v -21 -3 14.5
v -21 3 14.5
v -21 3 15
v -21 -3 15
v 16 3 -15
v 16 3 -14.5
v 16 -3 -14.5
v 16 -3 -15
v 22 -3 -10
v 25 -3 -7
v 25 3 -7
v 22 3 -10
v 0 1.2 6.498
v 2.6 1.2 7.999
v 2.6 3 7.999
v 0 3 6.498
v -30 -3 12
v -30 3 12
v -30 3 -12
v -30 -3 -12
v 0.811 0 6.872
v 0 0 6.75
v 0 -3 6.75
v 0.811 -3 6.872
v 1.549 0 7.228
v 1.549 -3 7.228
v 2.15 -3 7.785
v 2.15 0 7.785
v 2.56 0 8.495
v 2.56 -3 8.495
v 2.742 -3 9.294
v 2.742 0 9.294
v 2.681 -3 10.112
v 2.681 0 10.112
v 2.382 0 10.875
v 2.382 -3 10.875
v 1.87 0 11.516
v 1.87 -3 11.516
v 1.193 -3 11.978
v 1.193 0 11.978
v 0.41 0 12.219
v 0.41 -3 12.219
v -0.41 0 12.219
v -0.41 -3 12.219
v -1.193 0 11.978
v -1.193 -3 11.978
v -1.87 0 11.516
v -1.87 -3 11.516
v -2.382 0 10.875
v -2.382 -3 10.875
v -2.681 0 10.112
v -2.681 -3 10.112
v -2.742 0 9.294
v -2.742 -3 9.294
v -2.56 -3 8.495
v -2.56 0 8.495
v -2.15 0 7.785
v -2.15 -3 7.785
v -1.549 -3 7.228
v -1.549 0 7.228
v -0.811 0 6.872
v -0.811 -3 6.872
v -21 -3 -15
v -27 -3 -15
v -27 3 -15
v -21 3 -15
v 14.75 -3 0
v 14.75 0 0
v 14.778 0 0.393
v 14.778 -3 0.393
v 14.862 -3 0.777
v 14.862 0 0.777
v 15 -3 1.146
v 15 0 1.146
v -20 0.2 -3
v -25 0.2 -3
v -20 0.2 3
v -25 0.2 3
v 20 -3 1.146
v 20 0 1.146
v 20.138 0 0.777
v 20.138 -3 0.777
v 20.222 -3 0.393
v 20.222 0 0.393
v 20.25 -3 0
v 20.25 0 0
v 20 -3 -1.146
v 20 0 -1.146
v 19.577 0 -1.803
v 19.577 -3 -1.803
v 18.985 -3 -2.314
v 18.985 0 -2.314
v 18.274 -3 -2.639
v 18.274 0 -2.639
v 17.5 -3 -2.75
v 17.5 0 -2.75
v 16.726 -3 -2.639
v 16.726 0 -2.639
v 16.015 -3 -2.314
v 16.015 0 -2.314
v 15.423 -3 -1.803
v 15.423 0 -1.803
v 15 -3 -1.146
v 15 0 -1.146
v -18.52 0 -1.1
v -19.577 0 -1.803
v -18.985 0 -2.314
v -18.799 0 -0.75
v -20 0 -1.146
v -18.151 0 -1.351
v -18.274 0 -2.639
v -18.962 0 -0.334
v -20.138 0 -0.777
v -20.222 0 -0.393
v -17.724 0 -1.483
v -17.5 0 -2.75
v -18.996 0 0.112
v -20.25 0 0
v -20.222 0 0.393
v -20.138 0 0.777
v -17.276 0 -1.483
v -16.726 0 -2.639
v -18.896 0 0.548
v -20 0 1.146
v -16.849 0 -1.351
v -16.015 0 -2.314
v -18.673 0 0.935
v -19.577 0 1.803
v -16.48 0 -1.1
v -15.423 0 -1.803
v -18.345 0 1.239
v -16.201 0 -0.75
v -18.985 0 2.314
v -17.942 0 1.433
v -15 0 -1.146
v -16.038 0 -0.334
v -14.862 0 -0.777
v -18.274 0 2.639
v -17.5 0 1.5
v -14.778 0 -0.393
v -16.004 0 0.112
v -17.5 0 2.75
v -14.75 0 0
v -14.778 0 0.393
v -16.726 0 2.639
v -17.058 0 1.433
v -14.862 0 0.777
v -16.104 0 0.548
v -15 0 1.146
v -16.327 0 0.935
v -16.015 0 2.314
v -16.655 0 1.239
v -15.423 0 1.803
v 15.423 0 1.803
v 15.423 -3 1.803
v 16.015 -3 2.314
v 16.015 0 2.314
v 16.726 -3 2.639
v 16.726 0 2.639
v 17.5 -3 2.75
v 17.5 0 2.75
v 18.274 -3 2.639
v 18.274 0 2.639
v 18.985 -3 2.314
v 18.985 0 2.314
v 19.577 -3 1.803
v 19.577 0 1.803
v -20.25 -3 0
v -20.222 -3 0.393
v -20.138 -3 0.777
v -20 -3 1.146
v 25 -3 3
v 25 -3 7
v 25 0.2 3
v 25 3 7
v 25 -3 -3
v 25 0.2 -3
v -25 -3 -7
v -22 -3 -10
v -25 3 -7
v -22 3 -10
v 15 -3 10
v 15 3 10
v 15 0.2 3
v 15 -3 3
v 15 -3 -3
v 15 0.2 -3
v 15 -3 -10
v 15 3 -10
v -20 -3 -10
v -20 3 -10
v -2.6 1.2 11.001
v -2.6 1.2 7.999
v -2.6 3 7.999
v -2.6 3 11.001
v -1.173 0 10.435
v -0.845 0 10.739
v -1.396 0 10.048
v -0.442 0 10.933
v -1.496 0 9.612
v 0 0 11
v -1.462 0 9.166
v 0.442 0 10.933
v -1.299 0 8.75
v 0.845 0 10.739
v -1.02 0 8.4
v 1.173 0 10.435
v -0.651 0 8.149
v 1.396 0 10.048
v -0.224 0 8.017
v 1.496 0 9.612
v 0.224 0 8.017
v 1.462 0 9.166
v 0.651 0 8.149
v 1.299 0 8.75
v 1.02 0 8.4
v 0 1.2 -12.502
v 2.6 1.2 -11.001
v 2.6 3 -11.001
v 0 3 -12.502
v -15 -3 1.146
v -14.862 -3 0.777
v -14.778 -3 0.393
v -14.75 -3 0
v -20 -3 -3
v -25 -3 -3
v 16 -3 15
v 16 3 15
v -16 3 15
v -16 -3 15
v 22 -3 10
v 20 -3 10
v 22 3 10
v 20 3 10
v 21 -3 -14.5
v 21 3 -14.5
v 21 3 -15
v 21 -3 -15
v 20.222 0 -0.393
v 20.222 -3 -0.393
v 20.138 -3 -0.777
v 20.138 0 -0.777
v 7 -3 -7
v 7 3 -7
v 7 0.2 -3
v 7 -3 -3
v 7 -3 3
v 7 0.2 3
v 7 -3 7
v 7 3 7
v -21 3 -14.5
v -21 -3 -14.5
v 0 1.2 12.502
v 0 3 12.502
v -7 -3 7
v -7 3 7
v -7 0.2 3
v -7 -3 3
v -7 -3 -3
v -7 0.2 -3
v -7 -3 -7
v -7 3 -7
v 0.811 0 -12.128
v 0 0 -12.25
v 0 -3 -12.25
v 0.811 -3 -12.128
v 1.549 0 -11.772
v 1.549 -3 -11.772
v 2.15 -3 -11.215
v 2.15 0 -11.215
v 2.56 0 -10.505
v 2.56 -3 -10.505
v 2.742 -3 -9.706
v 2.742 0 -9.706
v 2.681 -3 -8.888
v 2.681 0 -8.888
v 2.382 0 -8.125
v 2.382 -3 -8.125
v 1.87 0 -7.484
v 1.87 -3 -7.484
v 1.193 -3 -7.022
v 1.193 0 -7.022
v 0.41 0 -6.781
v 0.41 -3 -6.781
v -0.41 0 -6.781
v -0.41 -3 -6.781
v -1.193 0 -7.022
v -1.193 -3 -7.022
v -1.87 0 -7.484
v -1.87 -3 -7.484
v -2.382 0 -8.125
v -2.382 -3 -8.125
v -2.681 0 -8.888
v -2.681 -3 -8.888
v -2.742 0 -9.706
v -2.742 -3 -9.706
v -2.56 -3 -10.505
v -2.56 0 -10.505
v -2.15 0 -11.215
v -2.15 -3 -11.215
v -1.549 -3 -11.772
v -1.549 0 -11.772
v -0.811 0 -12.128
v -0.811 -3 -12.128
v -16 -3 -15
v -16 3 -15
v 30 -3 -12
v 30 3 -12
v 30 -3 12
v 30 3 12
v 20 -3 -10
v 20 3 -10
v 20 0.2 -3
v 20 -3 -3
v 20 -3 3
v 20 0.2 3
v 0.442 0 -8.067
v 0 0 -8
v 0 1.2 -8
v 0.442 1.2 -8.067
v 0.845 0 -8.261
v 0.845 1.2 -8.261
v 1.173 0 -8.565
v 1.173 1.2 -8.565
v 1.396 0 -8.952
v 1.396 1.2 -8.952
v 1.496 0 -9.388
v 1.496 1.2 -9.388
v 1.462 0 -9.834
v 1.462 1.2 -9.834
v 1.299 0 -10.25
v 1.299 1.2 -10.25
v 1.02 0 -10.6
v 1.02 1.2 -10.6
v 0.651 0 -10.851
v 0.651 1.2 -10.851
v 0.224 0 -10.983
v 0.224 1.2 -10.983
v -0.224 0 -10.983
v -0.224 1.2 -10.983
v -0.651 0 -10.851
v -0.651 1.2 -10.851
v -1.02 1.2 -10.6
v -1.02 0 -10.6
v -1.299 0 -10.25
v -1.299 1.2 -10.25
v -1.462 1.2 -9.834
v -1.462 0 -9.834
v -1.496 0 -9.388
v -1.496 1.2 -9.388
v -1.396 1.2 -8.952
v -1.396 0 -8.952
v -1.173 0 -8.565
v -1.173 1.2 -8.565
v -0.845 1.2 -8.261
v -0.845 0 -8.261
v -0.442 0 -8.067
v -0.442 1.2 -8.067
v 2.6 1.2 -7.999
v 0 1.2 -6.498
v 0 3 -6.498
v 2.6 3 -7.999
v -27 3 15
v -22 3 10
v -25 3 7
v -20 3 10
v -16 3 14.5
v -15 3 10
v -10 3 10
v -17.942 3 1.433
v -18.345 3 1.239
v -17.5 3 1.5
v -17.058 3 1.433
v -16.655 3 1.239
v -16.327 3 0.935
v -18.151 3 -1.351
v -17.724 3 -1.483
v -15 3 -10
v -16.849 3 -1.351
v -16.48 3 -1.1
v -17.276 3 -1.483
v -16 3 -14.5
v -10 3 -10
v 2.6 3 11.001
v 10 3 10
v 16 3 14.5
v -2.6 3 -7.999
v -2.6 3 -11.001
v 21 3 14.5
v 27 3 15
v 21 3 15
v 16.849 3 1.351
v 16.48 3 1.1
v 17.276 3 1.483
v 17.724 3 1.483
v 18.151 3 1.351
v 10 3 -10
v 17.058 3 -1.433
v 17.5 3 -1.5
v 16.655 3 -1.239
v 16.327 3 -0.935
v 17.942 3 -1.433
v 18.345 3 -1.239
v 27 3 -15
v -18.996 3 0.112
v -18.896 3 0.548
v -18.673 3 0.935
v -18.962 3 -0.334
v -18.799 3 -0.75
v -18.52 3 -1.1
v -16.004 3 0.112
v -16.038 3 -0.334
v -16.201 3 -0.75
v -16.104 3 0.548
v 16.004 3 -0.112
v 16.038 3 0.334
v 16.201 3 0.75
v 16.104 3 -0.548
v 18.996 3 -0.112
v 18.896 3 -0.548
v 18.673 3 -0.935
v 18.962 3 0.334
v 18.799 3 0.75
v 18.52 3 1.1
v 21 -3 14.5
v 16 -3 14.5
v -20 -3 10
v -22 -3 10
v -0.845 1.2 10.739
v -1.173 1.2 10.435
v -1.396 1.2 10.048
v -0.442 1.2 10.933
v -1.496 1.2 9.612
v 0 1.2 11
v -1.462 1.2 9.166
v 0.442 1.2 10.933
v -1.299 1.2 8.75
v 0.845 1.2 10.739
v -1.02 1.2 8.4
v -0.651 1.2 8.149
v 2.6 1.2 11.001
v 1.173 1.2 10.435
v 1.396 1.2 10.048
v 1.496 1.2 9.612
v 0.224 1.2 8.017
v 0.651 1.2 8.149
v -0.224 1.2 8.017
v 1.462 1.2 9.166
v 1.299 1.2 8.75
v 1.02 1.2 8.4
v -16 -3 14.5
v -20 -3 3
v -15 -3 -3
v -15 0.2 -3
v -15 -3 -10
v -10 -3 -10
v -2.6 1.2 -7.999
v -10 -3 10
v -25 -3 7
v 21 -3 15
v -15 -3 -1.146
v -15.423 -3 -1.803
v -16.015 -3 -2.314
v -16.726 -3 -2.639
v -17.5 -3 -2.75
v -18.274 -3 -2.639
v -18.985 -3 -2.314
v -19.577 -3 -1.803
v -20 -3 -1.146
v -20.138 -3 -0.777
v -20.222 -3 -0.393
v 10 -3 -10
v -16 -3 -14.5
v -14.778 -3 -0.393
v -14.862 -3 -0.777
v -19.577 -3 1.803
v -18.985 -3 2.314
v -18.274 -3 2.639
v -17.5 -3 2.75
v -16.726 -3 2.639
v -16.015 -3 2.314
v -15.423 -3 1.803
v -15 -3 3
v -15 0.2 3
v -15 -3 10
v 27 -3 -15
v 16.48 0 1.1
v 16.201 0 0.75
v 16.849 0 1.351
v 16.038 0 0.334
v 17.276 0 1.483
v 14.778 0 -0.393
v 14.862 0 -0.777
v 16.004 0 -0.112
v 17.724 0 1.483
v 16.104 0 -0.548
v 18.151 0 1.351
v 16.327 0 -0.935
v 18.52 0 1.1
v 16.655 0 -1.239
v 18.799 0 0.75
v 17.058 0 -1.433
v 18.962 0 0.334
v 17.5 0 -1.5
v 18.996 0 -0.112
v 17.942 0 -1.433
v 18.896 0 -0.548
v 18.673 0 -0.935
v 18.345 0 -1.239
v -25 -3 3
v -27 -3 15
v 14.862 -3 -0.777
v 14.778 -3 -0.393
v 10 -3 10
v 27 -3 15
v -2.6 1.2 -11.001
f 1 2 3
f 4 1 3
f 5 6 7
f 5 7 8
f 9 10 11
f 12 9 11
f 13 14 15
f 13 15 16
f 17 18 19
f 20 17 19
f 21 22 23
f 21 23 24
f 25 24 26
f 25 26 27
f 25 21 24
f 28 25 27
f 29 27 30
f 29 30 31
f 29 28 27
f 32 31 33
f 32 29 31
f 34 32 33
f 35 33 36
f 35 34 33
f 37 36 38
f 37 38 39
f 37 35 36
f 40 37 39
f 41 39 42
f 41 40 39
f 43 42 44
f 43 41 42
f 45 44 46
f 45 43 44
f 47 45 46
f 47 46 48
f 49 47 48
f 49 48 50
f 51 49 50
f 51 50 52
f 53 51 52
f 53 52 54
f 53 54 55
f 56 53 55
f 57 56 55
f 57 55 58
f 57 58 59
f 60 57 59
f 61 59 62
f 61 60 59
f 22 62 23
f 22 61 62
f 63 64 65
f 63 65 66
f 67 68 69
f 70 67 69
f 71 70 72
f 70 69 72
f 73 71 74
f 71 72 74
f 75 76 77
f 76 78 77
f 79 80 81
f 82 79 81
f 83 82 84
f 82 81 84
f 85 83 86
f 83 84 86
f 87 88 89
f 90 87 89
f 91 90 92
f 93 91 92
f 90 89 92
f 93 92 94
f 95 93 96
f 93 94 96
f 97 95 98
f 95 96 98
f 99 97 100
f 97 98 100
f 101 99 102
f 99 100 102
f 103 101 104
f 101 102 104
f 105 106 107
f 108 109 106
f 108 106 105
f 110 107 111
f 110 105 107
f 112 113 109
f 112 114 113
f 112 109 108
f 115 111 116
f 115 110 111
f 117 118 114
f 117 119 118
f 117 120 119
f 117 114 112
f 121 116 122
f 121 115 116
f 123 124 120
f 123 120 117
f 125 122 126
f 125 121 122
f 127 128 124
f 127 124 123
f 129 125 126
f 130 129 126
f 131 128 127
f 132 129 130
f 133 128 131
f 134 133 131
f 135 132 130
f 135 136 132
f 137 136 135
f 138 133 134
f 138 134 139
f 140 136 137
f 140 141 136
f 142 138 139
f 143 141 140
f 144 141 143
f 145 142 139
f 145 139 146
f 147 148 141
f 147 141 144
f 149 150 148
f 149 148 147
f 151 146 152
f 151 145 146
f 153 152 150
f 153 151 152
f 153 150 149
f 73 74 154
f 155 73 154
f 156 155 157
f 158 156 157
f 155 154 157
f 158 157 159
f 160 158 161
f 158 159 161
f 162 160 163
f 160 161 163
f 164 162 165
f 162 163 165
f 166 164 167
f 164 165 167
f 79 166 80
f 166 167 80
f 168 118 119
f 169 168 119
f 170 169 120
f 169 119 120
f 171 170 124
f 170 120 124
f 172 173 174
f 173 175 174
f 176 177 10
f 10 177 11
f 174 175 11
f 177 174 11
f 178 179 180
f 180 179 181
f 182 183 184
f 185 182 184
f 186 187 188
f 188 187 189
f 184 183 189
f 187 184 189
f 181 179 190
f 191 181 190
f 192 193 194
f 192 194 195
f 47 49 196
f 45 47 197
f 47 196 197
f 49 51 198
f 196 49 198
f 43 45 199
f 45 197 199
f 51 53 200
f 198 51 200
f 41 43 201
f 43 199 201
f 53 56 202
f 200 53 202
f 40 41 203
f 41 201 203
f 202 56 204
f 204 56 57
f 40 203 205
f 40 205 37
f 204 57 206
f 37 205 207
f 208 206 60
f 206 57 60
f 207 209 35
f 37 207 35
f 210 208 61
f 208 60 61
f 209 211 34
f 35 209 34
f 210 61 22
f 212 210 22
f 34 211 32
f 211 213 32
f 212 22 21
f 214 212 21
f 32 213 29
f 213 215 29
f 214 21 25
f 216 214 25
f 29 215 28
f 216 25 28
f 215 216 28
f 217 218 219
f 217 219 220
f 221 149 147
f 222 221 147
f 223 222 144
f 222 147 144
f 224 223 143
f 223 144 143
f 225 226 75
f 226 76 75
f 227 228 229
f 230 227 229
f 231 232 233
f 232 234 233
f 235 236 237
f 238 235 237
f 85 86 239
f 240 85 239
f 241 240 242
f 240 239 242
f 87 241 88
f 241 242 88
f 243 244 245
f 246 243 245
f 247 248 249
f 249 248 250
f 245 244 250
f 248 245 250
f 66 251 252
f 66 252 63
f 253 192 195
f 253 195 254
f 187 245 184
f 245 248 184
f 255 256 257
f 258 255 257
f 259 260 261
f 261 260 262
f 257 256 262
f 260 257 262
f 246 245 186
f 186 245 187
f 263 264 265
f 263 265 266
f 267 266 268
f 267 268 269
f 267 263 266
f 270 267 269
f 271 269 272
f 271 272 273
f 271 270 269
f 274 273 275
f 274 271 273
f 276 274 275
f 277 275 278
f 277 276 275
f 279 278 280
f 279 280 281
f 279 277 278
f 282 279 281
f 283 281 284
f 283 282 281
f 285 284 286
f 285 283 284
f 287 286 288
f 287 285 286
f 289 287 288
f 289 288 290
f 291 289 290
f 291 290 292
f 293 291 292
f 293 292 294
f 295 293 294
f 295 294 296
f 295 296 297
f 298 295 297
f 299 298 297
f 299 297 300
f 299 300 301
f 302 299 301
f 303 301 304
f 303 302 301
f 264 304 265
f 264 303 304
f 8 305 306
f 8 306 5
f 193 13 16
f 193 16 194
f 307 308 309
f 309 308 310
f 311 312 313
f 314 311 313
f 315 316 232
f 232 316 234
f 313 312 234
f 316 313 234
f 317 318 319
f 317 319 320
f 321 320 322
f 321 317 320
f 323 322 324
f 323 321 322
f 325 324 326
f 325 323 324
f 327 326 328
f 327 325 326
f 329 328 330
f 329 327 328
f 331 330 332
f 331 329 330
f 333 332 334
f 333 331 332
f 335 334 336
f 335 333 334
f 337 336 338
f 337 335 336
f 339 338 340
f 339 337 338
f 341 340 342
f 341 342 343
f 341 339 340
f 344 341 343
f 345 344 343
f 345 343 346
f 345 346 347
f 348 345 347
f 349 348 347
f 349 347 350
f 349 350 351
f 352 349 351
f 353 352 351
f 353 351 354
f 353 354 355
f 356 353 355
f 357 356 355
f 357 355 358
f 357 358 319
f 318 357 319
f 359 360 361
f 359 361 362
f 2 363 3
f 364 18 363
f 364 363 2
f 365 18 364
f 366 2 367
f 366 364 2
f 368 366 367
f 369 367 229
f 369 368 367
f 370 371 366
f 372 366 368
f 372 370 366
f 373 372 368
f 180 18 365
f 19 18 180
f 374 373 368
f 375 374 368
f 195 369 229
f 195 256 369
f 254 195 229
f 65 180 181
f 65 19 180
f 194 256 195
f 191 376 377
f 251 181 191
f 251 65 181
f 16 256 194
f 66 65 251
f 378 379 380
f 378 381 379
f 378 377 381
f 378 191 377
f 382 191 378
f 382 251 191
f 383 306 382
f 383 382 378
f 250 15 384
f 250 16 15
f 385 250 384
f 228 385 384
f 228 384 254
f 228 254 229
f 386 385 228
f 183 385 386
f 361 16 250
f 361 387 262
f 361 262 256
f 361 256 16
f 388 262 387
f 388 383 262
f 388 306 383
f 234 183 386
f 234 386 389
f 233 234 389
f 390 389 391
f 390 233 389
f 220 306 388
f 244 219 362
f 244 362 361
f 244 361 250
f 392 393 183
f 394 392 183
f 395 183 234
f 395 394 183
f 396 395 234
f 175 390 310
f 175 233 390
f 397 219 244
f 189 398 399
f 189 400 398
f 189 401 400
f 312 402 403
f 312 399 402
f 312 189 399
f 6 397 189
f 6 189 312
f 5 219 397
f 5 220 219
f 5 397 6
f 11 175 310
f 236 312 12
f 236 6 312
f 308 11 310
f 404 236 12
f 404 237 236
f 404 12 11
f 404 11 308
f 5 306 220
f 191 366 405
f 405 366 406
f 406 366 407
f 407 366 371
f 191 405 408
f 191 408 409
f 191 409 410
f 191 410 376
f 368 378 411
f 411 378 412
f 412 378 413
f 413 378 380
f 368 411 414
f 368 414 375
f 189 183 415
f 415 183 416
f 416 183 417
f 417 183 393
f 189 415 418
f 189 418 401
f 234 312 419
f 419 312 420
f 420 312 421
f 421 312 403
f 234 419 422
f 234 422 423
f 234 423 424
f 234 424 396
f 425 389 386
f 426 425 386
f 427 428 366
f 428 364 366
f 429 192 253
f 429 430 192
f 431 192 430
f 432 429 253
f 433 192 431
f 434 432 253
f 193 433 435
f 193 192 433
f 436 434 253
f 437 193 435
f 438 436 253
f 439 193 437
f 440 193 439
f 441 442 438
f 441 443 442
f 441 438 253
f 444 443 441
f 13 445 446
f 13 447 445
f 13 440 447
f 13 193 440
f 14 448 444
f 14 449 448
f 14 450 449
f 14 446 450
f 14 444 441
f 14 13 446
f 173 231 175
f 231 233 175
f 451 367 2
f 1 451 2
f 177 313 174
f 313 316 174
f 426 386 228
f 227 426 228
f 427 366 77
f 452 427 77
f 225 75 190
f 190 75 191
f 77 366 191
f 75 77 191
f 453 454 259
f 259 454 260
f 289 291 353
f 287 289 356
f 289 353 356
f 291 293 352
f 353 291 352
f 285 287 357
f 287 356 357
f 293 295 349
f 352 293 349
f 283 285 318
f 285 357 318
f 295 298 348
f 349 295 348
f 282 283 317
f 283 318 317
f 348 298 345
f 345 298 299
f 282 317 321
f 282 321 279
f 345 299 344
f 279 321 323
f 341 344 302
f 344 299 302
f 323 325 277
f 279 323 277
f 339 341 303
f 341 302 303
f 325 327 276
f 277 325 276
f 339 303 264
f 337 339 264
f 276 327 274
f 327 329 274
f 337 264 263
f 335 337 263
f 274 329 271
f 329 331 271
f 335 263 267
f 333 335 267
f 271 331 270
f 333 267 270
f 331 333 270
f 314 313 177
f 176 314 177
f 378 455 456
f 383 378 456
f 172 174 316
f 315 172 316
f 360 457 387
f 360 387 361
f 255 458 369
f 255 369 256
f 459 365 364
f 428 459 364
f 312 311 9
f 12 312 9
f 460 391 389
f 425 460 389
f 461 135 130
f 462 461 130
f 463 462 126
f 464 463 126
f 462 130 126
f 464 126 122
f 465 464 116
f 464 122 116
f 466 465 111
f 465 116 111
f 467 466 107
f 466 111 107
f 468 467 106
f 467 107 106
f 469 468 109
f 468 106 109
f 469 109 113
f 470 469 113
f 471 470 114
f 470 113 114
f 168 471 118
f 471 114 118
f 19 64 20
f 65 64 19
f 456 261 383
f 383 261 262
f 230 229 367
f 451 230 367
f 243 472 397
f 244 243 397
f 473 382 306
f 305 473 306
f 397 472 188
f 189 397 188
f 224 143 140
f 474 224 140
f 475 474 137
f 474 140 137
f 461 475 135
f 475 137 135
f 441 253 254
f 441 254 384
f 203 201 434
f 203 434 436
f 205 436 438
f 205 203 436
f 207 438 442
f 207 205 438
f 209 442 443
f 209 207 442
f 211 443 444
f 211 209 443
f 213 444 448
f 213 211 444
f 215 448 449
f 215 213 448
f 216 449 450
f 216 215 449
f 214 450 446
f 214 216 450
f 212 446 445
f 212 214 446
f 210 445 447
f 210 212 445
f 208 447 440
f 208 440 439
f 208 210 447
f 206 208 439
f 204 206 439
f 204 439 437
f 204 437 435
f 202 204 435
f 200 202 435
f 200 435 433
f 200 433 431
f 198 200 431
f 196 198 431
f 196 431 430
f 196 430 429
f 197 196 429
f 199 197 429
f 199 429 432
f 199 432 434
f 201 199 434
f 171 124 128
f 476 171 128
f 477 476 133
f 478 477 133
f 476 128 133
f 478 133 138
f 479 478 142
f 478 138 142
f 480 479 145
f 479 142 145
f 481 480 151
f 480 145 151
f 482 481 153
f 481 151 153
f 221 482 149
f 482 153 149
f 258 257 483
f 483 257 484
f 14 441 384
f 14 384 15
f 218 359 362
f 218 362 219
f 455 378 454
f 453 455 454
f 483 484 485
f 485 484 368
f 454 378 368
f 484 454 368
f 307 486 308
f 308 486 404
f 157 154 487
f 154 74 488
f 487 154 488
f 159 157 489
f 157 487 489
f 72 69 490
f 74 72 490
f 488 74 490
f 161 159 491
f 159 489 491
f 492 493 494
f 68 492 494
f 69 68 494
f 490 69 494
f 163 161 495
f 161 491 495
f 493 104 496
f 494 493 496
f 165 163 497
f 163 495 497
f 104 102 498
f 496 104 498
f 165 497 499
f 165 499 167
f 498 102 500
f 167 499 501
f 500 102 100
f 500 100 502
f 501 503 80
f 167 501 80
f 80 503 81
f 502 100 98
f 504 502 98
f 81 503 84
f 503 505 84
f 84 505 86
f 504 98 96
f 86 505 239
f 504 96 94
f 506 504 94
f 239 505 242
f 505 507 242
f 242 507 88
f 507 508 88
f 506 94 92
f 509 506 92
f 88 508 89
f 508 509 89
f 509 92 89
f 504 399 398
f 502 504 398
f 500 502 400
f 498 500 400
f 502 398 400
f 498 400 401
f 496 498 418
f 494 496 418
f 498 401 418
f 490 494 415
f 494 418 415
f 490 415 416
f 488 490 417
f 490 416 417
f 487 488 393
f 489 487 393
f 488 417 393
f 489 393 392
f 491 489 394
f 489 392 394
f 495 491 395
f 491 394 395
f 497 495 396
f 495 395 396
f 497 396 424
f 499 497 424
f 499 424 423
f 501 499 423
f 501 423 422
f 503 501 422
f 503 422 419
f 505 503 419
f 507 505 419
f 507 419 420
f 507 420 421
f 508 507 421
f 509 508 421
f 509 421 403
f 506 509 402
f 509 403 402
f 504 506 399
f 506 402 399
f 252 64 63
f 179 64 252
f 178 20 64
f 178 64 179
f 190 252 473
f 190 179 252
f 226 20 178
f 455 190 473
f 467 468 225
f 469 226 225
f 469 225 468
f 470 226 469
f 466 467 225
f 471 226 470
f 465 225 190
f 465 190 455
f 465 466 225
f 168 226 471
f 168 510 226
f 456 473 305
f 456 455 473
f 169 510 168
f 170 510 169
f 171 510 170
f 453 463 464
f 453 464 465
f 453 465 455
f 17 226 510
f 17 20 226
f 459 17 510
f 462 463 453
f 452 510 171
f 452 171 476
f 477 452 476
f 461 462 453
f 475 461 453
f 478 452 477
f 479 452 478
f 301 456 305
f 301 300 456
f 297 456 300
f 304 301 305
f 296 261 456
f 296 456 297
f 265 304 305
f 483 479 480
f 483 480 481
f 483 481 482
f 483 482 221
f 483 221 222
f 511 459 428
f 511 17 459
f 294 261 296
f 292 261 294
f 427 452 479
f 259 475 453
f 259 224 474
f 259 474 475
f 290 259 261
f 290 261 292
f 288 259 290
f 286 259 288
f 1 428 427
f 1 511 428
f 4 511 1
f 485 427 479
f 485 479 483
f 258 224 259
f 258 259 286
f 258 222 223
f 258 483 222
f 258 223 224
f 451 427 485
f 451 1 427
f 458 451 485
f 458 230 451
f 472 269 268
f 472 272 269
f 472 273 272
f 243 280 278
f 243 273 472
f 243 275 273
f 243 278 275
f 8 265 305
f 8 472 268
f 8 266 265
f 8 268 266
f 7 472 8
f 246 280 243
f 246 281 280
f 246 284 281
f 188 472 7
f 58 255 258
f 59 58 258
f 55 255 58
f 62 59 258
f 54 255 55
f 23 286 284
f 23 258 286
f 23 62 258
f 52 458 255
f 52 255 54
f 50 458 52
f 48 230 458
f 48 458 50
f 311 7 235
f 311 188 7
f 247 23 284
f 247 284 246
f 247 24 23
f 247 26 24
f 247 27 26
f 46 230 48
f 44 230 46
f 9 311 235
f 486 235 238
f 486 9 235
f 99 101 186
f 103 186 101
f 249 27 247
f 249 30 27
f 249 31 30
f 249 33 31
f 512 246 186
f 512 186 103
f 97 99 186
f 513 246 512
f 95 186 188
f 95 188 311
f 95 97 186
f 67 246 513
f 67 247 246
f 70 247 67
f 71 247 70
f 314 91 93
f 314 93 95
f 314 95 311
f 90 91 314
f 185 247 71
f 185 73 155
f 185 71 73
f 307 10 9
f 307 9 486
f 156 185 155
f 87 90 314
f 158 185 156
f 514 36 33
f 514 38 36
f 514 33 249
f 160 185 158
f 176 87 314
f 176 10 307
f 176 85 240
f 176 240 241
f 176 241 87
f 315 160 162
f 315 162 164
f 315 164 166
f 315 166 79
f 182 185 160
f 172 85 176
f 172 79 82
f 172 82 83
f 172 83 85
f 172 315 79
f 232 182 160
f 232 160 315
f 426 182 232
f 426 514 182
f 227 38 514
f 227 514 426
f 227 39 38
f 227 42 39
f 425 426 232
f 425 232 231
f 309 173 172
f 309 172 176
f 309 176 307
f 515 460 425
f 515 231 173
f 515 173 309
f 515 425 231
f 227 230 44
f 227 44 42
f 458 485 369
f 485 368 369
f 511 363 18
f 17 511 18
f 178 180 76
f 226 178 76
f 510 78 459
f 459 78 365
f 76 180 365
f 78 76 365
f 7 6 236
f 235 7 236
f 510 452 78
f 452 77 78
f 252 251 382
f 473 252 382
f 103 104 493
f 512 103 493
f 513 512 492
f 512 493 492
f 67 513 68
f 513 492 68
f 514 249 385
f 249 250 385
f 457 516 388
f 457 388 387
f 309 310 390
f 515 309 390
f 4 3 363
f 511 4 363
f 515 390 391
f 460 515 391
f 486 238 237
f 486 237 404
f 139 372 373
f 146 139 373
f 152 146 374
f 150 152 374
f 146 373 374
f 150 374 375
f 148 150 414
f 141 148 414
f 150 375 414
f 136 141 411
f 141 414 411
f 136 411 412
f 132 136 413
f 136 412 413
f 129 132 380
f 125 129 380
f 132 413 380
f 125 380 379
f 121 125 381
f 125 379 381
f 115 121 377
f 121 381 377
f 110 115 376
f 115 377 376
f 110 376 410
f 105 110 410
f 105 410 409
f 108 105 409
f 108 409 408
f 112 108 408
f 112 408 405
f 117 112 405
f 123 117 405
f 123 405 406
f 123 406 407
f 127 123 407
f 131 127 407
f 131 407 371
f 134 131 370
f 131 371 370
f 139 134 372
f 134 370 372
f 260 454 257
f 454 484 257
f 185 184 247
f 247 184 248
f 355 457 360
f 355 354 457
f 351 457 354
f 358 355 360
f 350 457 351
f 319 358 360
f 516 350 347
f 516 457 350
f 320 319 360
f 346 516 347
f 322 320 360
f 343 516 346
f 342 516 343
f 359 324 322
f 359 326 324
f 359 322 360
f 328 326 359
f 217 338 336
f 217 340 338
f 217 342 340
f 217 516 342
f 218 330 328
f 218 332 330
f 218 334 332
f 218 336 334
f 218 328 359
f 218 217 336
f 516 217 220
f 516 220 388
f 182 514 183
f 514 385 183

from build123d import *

# Parameters (mm, degrees)
SKETCH_1_W          = 60
SKETCH_1_H          = 30
SKETCH_1_W_2        = 18
SKETCH_1_H_2        = 20
SKETCH_1_R          = 1.5
EXTRUDE_1_DEPTH     = 3
CUT_EXTRUDE_START   = 1.2
SKETCH_1_3_R        = 1.5
CUT_EXTRUDE_1_DEPTH = 1.8
CHAMFER_1_SIZE      = 3
SKETCH_2_W          = 5
SKETCH_2_H          = 0.5
CUT_EXTRUDE_2_DEPTH = 34.674916481
SKETCH_3_W          = 5
SKETCH_3_H          = 20
SKETCH_3_R          = 1.5
EXTRUDE_2_DEPTH     = 3
SKETCH_4_R          = 2.75
SKETCH_4_W          = 14
SKETCH_4_H          = 3
EXTRUDE_3_DEPTH     = 3
EXTRUDE_START       = -0.2
EXTRUDE_4_DEPTH     = 0.2


with BuildPart() as part:
    # 스케치1 → 보스-돌출1 (new body)
    # profile 1 of 3: a face of its own
    with BuildSketch(Plane(origin=(0, 0, 0), x_dir=(1, 0, 0), z_dir=(0, 1, 0))):
        Rectangle(SKETCH_1_W, SKETCH_1_H)
        Polygon((2.6, 11.0011107), (0, 12.5022214), (-2.6, 11.0011107), (-2.6, 7.9988893), (0, 6.4977786), (2.6, 7.9988893), align=None, mode=Mode.SUBTRACT)
        Polygon((2.6, -7.9988893), (0, -6.4977786), (-2.6, -7.9988893), (-2.6, -11.0011107), (0, -12.5022214), (2.6, -11.0011107), align=None, mode=Mode.SUBTRACT)
        with Locations((-16, 0)):
            Rectangle(SKETCH_1_W_2, SKETCH_1_H_2, mode=Mode.SUBTRACT)
        with Locations((16, 0)):
            Rectangle(SKETCH_1_W_2, SKETCH_1_H_2, mode=Mode.SUBTRACT)
    # profile 2 of 3: a face of its own
    with BuildSketch(Plane(origin=(0, 0, 0), x_dir=(1, 0, 0), z_dir=(0, 1, 0))):
        Polygon((2.6, -11.0011107), (2.6, -7.9988893), (0, -6.4977786), (-2.6, -7.9988893), (-2.6, -11.0011107), (0, -12.5022214), align=None)
        with Locations(Location((0, -9.5, 0), (0, 0, 270))):
            Circle(SKETCH_1_R, mode=Mode.SUBTRACT)
    # profile 3 of 3: a face of its own
    with BuildSketch(Plane(origin=(0, 0, 0), x_dir=(1, 0, 0), z_dir=(0, 1, 0))):
        Polygon((2.6, 7.9988893), (2.6, 11.0011107), (0, 12.5022214), (-2.6, 11.0011107), (-2.6, 7.9988893), (0, 6.4977786), align=None)
        with Locations(Location((0, 9.5, 0), (0, 0, 270))):
            Circle(SKETCH_1_R, mode=Mode.SUBTRACT)
    extrude(amount=EXTRUDE_1_DEPTH)

    # 스케치1<3> → 컷-돌출1 (cut)
    # profile 1 of 2: a face of its own
    with BuildSketch(Plane(origin=(0, 0, 0), x_dir=(1, 0, 0), z_dir=(0, 1, 0)).offset(CUT_EXTRUDE_START)):
        Polygon((2.6, -11.0011107), (2.6, -7.9988893), (0, -6.4977786), (-2.6, -7.9988893), (-2.6, -11.0011107), (0, -12.5022214), align=None)
        with Locations(Location((0, -9.5, 0), (0, 0, 270))):
            Circle(SKETCH_1_3_R, mode=Mode.SUBTRACT)
    # profile 2 of 2: a face of its own
    with BuildSketch(Plane(origin=(0, 0, 0), x_dir=(1, 0, 0), z_dir=(0, 1, 0)).offset(CUT_EXTRUDE_START)):
        Polygon((2.6, 7.9988893), (2.6, 11.0011107), (0, 12.5022214), (-2.6, 11.0011107), (-2.6, 7.9988893), (0, 6.4977786), align=None)
        with Locations(Location((0, 9.5, 0), (0, 0, 270))):
            Circle(SKETCH_1_3_R, mode=Mode.SUBTRACT)
    extrude(amount=CUT_EXTRUDE_1_DEPTH, mode=Mode.SUBTRACT)

    # 모따기1
    chamfer_1_edges = [part.edges().sort_by_distance(p)[0] for p in [
        (25, 1.5, -10),
        (7, 1.5, -10),
        (7, 1.5, 10),
        (25, 1.5, 10),
        (-25, 1.5, -10),
        (-25, 1.5, 10),
        (-7, 1.5, 10),
        (-7, 1.5, -10),
        (-30, 1.5, 15),
        (-30, 1.5, -15),
        (30, 1.5, -15),
        (30, 1.5, 15),
    ]]
    chamfer(chamfer_1_edges, length=CHAMFER_1_SIZE)

    # 스케치2 → 컷-돌출2 (cut, through all)
    with BuildSketch(Plane(origin=(0, 3, 0), x_dir=(1, 0, 0), z_dir=(0, 1, 0))):
        with Locations((-18.5, -14.75)):
            Rectangle(SKETCH_2_W, SKETCH_2_H)
        with Locations((18.5, -14.75)):
            Rectangle(SKETCH_2_W, SKETCH_2_H)
        with Locations((18.5, 14.75)):
            Rectangle(SKETCH_2_W, SKETCH_2_H)
        with Locations((-18.5, 14.75)):
            Rectangle(SKETCH_2_W, SKETCH_2_H)
    extrude(amount=-CUT_EXTRUDE_2_DEPTH, mode=Mode.SUBTRACT)

    # 스케치3 → 보스-돌출2 (add)
    # profile 1 of 2: a face of its own
    with BuildSketch(Plane(origin=(0, 3, 0), x_dir=(1, 0, 0), z_dir=(0, 1, 0))):
        with Locations((-17.5, 0)):
            Rectangle(SKETCH_3_W, SKETCH_3_H)
        with Locations(Location((-17.5, 0, 0), (0, 0, 270))):
            Circle(SKETCH_3_R, mode=Mode.SUBTRACT)
    # profile 2 of 2: a face of its own
    with BuildSketch(Plane(origin=(0, 3, 0), x_dir=(1, 0, 0), z_dir=(0, 1, 0))):
        with Locations((17.5, 0)):
            Rectangle(SKETCH_3_W, SKETCH_3_H)
        with Locations(Location((17.5, 0, 0), (0, 0, 90))):
            Circle(SKETCH_3_R, mode=Mode.SUBTRACT)
    extrude(amount=-EXTRUDE_2_DEPTH)

    # 스케치4 → 보스-돌출3 (add)
    # profile 1 of 16: a face of its own
    with BuildSketch(Plane.XZ):
        Polygon((-25, 7), (-22, 10), (-20, 10), (-20, 3), (-15, 3), (-15, 10), (-10, 10), (-7, 7), (-7, 3), (7, 3), (7, 7), (10, 10), (15, 10), (15, 3), (20, 3), (20, 10), (22, 10), (25, 7), (25, 3), (25, 0), (30, 0), (30, 12), (27, 15), (21, 15), (21, 14.5), (16, 14.5), (16, 15), (-16, 15), (-16, 14.5), (-21, 14.5), (-21, 15), (-27, 15), (-30, 12), (-30, 0), (-25, 0), (-25, 3), align=None)
        with Locations(Location((0, 9.5, 0), (0, 0, 270))):
            Circle(SKETCH_4_R, mode=Mode.SUBTRACT)
    # profile 2 of 16: a face of its own
    with BuildSketch(Plane.XZ):
        Polygon((-25, -3), (-25, 0), (-30, 0), (-30, -12), (-27, -15), (-21, -15), (-21, -14.5), (-16, -14.5), (-16, -15), (16, -15), (16, -14.5), (21, -14.5), (21, -15), (27, -15), (30, -12), (30, 0), (25, 0), (25, -3), (25, -7), (22, -10), (20, -10), (20, -3), (15, -3), (15, -10), (10, -10), (7, -7), (7, -3), (-7, -3), (-7, -7), (-10, -10), (-15, -10), (-15, -3), (-20, -3), (-20, -10), (-22, -10), (-25, -7), align=None)
        with Locations(Location((0, -9.5, 0), (0, 0, 270))):
            Circle(SKETCH_4_R, mode=Mode.SUBTRACT)
    # profile 3 of 16: a face of its own
    with BuildSketch(Plane.XZ):
        with Locations((0, 1.5)):
            Rectangle(SKETCH_4_W, SKETCH_4_H)
    # profile 4 of 16: a face of its own
    with BuildSketch(Plane.XZ):
        with Locations((0, -1.5)):
            Rectangle(SKETCH_4_W, SKETCH_4_H)
    # profile 5 of 16: a face of its own
    with BuildSketch(Plane.XZ):
        with BuildLine():
            Line((-20, 1.145643924), (-20, 3))
            Line((-20, 3), (-25, 3))
            Line((-25, 3), (-25, 0))
            Line((-25, 0), (-20.25, 0))
            ThreePointArc((-20.25, 0), (-20.186773158, 0.58630197), (-20, 1.145643924))
        make_face()
    # profile 6 of 16: a face of its own
    with BuildSketch(Plane.XZ):
        with BuildLine():
            Line((-20.25, 0), (-25, 0))
            Line((-25, 0), (-25, -3))
            Line((-25, -3), (-20, -3))
            Line((-20, -3), (-20, -1.145643924))
            ThreePointArc((-20, -1.145643924), (-20.186773158, -0.58630197), (-20.25, 0))
        make_face()
    # profile 7 of 16: a face of its own
    with BuildSketch(Plane.XZ):
        with BuildLine():
            Line((-15, 3), (-20, 3))
            Line((-20, 3), (-20, 1.145643924))
            ThreePointArc((-20, 1.145643924), (-17.5, 2.75), (-15, 1.145643924))
            Line((-15, 1.145643924), (-15, 3))
        make_face()
    # profile 8 of 16: a face of its own
    with BuildSketch(Plane.XZ):
        with BuildLine():
            Line((-7, 3), (-15, 3))
            Line((-15, 3), (-15, 1.145643924))
            ThreePointArc((-15, 1.145643924), (-14.813226842, 0.58630197), (-14.75, 0))
            Line((-14.75, 0), (-7, 0))
            Line((-7, 0), (-7, 3))
        make_face()
    # profile 9 of 16: a face of its own
    with BuildSketch(Plane.XZ):
        with BuildLine():
            ThreePointArc((-15, -1.145643924), (-17.5, -2.75), (-20, -1.145643924))
            Line((-20, -1.145643924), (-20, -3))
            Line((-20, -3), (-15, -3))
            Line((-15, -3), (-15, -1.145643924))
        make_face()
    # profile 10 of 16: a face of its own
    with BuildSketch(Plane.XZ):
        with BuildLine():
            Line((-7, 0), (-14.75, 0))
            ThreePointArc((-14.75, 0), (-14.813226842, -0.58630197), (-15, -1.145643924))
            Line((-15, -1.145643924), (-15, -3))
            Line((-15, -3), (-7, -3))
            Line((-7, -3), (-7, 0))
        make_face()
    # profile 11 of 16: a face of its own
    with BuildSketch(Plane.XZ):
        with BuildLine():
            Line((15, 3), (7, 3))
            Line((7, 3), (7, 0))
            Line((7, 0), (14.75, 0))
            ThreePointArc((14.75, 0), (14.813226842, 0.58630197), (15, 1.145643924))
            Line((15, 1.145643924), (15, 3))
        make_face()
    # profile 12 of 16: a face of its own
    with BuildSketch(Plane.XZ):
        with BuildLine():
            Line((14.75, 0), (7, 0))
            Line((7, 0), (7, -3))
            Line((7, -3), (15, -3))
            Line((15, -3), (15, -1.145643924))
            ThreePointArc((15, -1.145643924), (14.813226842, -0.58630197), (14.75, 0))
        make_face()
    # profile 13 of 16: a face of its own
    with BuildSketch(Plane.XZ):
        with BuildLine():
            Line((20, 3), (15, 3))
            Line((15, 3), (15, 1.145643924))
            ThreePointArc((15, 1.145643924), (17.5, 2.75), (20, 1.145643924))
            Line((20, 1.145643924), (20, 3))
        make_face()
    # profile 14 of 16: a face of its own
    with BuildSketch(Plane.XZ):
        with BuildLine():
            Line((15, -1.145643924), (15, -3))
            Line((15, -3), (20, -3))
            Line((20, -3), (20, -1.145643924))
            ThreePointArc((20, -1.145643924), (17.5, -2.75), (15, -1.145643924))
        make_face()
    # profile 15 of 16: a face of its own
    with BuildSketch(Plane.XZ):
        with BuildLine():
            Line((20, -1.145643924), (20, -3))
            Line((20, -3), (25, -3))
            Line((25, -3), (25, 0))
            Line((25, 0), (20.25, 0))
            ThreePointArc((20.25, 0), (20.186773158, -0.58630197), (20, -1.145643924))
        make_face()
    # profile 16 of 16: a face of its own
    with BuildSketch(Plane.XZ):
        with BuildLine():
            Line((25, 3), (20, 3))
            Line((20, 3), (20, 1.145643924))
            ThreePointArc((20, 1.145643924), (20.186773158, 0.58630197), (20.25, 0))
            Line((20.25, 0), (25, 0))
            Line((25, 0), (25, 3))
        make_face()
    extrude(amount=EXTRUDE_3_DEPTH)

    # 스케치4<3> → 보스-돌출4 (add)
    with BuildSketch(Plane.XZ.offset(EXTRUDE_START)):
        with BuildLine():
            ThreePointArc((20.25, 0), (20.186773158, 0.58630197), (20, 1.145643924))
            Line((20, 1.145643924), (20, 0))
            Line((20, 0), (20.25, 0))
        make_face()
        with BuildLine():
            Line((20, 0), (20, -1.145643924))
            ThreePointArc((20, -1.145643924), (20.186773158, -0.58630197), (20.25, 0))
            Line((20.25, 0), (20, 0))
        make_face()
        with BuildLine():
            Line((20, -1.145643924), (20, -3))
            Line((20, -3), (25, -3))
            Line((25, -3), (25, 0))
            Line((25, 0), (20.25, 0))
            ThreePointArc((20.25, 0), (20.186773158, -0.58630197), (20, -1.145643924))
        make_face()
        with BuildLine():
            Line((25, 3), (20, 3))
            Line((20, 3), (20, 1.145643924))
            ThreePointArc((20, 1.145643924), (20.186773158, 0.58630197), (20.25, 0))
            Line((20.25, 0), (25, 0))
            Line((25, 0), (25, 3))
        make_face()
        with BuildLine():
            ThreePointArc((15, 1.145643924), (14.813226842, 0.58630197), (14.75, 0))
            Line((14.75, 0), (15, 0))
            Line((15, 0), (15, 1.145643924))
        make_face()
        with BuildLine():
            Line((15, 0), (14.75, 0))
            ThreePointArc((14.75, 0), (14.813226842, -0.58630197), (15, -1.145643924))
            Line((15, -1.145643924), (15, 0))
        make_face()
        with BuildLine():
            Line((14.75, 0), (7, 0))
            Line((7, 0), (7, -3))
            Line((7, -3), (15, -3))
            Line((15, -3), (15, -1.145643924))
            ThreePointArc((15, -1.145643924), (14.813226842, -0.58630197), (14.75, 0))
        make_face()
        with BuildLine():
            Line((15, 3), (7, 3))
            Line((7, 3), (7, 0))
            Line((7, 0), (14.75, 0))
            ThreePointArc((14.75, 0), (14.813226842, 0.58630197), (15, 1.145643924))
            Line((15, 1.145643924), (15, 3))
        make_face()
        with BuildLine():
            Line((-20, 0), (-20, 1.145643924))
            ThreePointArc((-20, 1.145643924), (-20.186773158, 0.58630197), (-20.25, 0))
            Line((-20.25, 0), (-20, 0))
        make_face()
        with BuildLine():
            Line((-20, -1.145643924), (-20, 0))
            Line((-20, 0), (-20.25, 0))
            ThreePointArc((-20.25, 0), (-20.186773158, -0.58630197), (-20, -1.145643924))
        make_face()
        with BuildLine():
            Line((-20.25, 0), (-25, 0))
            Line((-25, 0), (-25, -3))
            Line((-25, -3), (-20, -3))
            Line((-20, -3), (-20, -1.145643924))
            ThreePointArc((-20, -1.145643924), (-20.186773158, -0.58630197), (-20.25, 0))
        make_face()
        with BuildLine():
            Line((-20, 1.145643924), (-20, 3))
            Line((-20, 3), (-25, 3))
            Line((-25, 3), (-25, 0))
            Line((-25, 0), (-20.25, 0))
            ThreePointArc((-20.25, 0), (-20.186773158, 0.58630197), (-20, 1.145643924))
        make_face()
        with BuildLine():
            Line((-7, 3), (-15, 3))
            Line((-15, 3), (-15, 1.145643924))
            ThreePointArc((-15, 1.145643924), (-14.813226842, 0.58630197), (-14.75, 0))
            Line((-14.75, 0), (-7, 0))
            Line((-7, 0), (-7, 3))
        make_face()
        with BuildLine():
            Line((-7, 0), (-14.75, 0))
            ThreePointArc((-14.75, 0), (-14.813226842, -0.58630197), (-15, -1.145643924))
            Line((-15, -1.145643924), (-15, -3))
            Line((-15, -3), (-7, -3))
            Line((-7, -3), (-7, 0))
        make_face()
        with BuildLine():
            ThreePointArc((-14.75, 0), (-14.813226842, 0.58630197), (-15, 1.145643924))
            Line((-15, 1.145643924), (-15, 0))
            Line((-15, 0), (-14.75, 0))
        make_face()
        with BuildLine():
            Line((-14.75, 0), (-15, 0))
            Line((-15, 0), (-15, -1.145643924))
            ThreePointArc((-15, -1.145643924), (-14.813226842, -0.58630197), (-14.75, 0))
        make_face()
    extrude(amount=EXTRUDE_4_DEPTH)


solid = part.part
